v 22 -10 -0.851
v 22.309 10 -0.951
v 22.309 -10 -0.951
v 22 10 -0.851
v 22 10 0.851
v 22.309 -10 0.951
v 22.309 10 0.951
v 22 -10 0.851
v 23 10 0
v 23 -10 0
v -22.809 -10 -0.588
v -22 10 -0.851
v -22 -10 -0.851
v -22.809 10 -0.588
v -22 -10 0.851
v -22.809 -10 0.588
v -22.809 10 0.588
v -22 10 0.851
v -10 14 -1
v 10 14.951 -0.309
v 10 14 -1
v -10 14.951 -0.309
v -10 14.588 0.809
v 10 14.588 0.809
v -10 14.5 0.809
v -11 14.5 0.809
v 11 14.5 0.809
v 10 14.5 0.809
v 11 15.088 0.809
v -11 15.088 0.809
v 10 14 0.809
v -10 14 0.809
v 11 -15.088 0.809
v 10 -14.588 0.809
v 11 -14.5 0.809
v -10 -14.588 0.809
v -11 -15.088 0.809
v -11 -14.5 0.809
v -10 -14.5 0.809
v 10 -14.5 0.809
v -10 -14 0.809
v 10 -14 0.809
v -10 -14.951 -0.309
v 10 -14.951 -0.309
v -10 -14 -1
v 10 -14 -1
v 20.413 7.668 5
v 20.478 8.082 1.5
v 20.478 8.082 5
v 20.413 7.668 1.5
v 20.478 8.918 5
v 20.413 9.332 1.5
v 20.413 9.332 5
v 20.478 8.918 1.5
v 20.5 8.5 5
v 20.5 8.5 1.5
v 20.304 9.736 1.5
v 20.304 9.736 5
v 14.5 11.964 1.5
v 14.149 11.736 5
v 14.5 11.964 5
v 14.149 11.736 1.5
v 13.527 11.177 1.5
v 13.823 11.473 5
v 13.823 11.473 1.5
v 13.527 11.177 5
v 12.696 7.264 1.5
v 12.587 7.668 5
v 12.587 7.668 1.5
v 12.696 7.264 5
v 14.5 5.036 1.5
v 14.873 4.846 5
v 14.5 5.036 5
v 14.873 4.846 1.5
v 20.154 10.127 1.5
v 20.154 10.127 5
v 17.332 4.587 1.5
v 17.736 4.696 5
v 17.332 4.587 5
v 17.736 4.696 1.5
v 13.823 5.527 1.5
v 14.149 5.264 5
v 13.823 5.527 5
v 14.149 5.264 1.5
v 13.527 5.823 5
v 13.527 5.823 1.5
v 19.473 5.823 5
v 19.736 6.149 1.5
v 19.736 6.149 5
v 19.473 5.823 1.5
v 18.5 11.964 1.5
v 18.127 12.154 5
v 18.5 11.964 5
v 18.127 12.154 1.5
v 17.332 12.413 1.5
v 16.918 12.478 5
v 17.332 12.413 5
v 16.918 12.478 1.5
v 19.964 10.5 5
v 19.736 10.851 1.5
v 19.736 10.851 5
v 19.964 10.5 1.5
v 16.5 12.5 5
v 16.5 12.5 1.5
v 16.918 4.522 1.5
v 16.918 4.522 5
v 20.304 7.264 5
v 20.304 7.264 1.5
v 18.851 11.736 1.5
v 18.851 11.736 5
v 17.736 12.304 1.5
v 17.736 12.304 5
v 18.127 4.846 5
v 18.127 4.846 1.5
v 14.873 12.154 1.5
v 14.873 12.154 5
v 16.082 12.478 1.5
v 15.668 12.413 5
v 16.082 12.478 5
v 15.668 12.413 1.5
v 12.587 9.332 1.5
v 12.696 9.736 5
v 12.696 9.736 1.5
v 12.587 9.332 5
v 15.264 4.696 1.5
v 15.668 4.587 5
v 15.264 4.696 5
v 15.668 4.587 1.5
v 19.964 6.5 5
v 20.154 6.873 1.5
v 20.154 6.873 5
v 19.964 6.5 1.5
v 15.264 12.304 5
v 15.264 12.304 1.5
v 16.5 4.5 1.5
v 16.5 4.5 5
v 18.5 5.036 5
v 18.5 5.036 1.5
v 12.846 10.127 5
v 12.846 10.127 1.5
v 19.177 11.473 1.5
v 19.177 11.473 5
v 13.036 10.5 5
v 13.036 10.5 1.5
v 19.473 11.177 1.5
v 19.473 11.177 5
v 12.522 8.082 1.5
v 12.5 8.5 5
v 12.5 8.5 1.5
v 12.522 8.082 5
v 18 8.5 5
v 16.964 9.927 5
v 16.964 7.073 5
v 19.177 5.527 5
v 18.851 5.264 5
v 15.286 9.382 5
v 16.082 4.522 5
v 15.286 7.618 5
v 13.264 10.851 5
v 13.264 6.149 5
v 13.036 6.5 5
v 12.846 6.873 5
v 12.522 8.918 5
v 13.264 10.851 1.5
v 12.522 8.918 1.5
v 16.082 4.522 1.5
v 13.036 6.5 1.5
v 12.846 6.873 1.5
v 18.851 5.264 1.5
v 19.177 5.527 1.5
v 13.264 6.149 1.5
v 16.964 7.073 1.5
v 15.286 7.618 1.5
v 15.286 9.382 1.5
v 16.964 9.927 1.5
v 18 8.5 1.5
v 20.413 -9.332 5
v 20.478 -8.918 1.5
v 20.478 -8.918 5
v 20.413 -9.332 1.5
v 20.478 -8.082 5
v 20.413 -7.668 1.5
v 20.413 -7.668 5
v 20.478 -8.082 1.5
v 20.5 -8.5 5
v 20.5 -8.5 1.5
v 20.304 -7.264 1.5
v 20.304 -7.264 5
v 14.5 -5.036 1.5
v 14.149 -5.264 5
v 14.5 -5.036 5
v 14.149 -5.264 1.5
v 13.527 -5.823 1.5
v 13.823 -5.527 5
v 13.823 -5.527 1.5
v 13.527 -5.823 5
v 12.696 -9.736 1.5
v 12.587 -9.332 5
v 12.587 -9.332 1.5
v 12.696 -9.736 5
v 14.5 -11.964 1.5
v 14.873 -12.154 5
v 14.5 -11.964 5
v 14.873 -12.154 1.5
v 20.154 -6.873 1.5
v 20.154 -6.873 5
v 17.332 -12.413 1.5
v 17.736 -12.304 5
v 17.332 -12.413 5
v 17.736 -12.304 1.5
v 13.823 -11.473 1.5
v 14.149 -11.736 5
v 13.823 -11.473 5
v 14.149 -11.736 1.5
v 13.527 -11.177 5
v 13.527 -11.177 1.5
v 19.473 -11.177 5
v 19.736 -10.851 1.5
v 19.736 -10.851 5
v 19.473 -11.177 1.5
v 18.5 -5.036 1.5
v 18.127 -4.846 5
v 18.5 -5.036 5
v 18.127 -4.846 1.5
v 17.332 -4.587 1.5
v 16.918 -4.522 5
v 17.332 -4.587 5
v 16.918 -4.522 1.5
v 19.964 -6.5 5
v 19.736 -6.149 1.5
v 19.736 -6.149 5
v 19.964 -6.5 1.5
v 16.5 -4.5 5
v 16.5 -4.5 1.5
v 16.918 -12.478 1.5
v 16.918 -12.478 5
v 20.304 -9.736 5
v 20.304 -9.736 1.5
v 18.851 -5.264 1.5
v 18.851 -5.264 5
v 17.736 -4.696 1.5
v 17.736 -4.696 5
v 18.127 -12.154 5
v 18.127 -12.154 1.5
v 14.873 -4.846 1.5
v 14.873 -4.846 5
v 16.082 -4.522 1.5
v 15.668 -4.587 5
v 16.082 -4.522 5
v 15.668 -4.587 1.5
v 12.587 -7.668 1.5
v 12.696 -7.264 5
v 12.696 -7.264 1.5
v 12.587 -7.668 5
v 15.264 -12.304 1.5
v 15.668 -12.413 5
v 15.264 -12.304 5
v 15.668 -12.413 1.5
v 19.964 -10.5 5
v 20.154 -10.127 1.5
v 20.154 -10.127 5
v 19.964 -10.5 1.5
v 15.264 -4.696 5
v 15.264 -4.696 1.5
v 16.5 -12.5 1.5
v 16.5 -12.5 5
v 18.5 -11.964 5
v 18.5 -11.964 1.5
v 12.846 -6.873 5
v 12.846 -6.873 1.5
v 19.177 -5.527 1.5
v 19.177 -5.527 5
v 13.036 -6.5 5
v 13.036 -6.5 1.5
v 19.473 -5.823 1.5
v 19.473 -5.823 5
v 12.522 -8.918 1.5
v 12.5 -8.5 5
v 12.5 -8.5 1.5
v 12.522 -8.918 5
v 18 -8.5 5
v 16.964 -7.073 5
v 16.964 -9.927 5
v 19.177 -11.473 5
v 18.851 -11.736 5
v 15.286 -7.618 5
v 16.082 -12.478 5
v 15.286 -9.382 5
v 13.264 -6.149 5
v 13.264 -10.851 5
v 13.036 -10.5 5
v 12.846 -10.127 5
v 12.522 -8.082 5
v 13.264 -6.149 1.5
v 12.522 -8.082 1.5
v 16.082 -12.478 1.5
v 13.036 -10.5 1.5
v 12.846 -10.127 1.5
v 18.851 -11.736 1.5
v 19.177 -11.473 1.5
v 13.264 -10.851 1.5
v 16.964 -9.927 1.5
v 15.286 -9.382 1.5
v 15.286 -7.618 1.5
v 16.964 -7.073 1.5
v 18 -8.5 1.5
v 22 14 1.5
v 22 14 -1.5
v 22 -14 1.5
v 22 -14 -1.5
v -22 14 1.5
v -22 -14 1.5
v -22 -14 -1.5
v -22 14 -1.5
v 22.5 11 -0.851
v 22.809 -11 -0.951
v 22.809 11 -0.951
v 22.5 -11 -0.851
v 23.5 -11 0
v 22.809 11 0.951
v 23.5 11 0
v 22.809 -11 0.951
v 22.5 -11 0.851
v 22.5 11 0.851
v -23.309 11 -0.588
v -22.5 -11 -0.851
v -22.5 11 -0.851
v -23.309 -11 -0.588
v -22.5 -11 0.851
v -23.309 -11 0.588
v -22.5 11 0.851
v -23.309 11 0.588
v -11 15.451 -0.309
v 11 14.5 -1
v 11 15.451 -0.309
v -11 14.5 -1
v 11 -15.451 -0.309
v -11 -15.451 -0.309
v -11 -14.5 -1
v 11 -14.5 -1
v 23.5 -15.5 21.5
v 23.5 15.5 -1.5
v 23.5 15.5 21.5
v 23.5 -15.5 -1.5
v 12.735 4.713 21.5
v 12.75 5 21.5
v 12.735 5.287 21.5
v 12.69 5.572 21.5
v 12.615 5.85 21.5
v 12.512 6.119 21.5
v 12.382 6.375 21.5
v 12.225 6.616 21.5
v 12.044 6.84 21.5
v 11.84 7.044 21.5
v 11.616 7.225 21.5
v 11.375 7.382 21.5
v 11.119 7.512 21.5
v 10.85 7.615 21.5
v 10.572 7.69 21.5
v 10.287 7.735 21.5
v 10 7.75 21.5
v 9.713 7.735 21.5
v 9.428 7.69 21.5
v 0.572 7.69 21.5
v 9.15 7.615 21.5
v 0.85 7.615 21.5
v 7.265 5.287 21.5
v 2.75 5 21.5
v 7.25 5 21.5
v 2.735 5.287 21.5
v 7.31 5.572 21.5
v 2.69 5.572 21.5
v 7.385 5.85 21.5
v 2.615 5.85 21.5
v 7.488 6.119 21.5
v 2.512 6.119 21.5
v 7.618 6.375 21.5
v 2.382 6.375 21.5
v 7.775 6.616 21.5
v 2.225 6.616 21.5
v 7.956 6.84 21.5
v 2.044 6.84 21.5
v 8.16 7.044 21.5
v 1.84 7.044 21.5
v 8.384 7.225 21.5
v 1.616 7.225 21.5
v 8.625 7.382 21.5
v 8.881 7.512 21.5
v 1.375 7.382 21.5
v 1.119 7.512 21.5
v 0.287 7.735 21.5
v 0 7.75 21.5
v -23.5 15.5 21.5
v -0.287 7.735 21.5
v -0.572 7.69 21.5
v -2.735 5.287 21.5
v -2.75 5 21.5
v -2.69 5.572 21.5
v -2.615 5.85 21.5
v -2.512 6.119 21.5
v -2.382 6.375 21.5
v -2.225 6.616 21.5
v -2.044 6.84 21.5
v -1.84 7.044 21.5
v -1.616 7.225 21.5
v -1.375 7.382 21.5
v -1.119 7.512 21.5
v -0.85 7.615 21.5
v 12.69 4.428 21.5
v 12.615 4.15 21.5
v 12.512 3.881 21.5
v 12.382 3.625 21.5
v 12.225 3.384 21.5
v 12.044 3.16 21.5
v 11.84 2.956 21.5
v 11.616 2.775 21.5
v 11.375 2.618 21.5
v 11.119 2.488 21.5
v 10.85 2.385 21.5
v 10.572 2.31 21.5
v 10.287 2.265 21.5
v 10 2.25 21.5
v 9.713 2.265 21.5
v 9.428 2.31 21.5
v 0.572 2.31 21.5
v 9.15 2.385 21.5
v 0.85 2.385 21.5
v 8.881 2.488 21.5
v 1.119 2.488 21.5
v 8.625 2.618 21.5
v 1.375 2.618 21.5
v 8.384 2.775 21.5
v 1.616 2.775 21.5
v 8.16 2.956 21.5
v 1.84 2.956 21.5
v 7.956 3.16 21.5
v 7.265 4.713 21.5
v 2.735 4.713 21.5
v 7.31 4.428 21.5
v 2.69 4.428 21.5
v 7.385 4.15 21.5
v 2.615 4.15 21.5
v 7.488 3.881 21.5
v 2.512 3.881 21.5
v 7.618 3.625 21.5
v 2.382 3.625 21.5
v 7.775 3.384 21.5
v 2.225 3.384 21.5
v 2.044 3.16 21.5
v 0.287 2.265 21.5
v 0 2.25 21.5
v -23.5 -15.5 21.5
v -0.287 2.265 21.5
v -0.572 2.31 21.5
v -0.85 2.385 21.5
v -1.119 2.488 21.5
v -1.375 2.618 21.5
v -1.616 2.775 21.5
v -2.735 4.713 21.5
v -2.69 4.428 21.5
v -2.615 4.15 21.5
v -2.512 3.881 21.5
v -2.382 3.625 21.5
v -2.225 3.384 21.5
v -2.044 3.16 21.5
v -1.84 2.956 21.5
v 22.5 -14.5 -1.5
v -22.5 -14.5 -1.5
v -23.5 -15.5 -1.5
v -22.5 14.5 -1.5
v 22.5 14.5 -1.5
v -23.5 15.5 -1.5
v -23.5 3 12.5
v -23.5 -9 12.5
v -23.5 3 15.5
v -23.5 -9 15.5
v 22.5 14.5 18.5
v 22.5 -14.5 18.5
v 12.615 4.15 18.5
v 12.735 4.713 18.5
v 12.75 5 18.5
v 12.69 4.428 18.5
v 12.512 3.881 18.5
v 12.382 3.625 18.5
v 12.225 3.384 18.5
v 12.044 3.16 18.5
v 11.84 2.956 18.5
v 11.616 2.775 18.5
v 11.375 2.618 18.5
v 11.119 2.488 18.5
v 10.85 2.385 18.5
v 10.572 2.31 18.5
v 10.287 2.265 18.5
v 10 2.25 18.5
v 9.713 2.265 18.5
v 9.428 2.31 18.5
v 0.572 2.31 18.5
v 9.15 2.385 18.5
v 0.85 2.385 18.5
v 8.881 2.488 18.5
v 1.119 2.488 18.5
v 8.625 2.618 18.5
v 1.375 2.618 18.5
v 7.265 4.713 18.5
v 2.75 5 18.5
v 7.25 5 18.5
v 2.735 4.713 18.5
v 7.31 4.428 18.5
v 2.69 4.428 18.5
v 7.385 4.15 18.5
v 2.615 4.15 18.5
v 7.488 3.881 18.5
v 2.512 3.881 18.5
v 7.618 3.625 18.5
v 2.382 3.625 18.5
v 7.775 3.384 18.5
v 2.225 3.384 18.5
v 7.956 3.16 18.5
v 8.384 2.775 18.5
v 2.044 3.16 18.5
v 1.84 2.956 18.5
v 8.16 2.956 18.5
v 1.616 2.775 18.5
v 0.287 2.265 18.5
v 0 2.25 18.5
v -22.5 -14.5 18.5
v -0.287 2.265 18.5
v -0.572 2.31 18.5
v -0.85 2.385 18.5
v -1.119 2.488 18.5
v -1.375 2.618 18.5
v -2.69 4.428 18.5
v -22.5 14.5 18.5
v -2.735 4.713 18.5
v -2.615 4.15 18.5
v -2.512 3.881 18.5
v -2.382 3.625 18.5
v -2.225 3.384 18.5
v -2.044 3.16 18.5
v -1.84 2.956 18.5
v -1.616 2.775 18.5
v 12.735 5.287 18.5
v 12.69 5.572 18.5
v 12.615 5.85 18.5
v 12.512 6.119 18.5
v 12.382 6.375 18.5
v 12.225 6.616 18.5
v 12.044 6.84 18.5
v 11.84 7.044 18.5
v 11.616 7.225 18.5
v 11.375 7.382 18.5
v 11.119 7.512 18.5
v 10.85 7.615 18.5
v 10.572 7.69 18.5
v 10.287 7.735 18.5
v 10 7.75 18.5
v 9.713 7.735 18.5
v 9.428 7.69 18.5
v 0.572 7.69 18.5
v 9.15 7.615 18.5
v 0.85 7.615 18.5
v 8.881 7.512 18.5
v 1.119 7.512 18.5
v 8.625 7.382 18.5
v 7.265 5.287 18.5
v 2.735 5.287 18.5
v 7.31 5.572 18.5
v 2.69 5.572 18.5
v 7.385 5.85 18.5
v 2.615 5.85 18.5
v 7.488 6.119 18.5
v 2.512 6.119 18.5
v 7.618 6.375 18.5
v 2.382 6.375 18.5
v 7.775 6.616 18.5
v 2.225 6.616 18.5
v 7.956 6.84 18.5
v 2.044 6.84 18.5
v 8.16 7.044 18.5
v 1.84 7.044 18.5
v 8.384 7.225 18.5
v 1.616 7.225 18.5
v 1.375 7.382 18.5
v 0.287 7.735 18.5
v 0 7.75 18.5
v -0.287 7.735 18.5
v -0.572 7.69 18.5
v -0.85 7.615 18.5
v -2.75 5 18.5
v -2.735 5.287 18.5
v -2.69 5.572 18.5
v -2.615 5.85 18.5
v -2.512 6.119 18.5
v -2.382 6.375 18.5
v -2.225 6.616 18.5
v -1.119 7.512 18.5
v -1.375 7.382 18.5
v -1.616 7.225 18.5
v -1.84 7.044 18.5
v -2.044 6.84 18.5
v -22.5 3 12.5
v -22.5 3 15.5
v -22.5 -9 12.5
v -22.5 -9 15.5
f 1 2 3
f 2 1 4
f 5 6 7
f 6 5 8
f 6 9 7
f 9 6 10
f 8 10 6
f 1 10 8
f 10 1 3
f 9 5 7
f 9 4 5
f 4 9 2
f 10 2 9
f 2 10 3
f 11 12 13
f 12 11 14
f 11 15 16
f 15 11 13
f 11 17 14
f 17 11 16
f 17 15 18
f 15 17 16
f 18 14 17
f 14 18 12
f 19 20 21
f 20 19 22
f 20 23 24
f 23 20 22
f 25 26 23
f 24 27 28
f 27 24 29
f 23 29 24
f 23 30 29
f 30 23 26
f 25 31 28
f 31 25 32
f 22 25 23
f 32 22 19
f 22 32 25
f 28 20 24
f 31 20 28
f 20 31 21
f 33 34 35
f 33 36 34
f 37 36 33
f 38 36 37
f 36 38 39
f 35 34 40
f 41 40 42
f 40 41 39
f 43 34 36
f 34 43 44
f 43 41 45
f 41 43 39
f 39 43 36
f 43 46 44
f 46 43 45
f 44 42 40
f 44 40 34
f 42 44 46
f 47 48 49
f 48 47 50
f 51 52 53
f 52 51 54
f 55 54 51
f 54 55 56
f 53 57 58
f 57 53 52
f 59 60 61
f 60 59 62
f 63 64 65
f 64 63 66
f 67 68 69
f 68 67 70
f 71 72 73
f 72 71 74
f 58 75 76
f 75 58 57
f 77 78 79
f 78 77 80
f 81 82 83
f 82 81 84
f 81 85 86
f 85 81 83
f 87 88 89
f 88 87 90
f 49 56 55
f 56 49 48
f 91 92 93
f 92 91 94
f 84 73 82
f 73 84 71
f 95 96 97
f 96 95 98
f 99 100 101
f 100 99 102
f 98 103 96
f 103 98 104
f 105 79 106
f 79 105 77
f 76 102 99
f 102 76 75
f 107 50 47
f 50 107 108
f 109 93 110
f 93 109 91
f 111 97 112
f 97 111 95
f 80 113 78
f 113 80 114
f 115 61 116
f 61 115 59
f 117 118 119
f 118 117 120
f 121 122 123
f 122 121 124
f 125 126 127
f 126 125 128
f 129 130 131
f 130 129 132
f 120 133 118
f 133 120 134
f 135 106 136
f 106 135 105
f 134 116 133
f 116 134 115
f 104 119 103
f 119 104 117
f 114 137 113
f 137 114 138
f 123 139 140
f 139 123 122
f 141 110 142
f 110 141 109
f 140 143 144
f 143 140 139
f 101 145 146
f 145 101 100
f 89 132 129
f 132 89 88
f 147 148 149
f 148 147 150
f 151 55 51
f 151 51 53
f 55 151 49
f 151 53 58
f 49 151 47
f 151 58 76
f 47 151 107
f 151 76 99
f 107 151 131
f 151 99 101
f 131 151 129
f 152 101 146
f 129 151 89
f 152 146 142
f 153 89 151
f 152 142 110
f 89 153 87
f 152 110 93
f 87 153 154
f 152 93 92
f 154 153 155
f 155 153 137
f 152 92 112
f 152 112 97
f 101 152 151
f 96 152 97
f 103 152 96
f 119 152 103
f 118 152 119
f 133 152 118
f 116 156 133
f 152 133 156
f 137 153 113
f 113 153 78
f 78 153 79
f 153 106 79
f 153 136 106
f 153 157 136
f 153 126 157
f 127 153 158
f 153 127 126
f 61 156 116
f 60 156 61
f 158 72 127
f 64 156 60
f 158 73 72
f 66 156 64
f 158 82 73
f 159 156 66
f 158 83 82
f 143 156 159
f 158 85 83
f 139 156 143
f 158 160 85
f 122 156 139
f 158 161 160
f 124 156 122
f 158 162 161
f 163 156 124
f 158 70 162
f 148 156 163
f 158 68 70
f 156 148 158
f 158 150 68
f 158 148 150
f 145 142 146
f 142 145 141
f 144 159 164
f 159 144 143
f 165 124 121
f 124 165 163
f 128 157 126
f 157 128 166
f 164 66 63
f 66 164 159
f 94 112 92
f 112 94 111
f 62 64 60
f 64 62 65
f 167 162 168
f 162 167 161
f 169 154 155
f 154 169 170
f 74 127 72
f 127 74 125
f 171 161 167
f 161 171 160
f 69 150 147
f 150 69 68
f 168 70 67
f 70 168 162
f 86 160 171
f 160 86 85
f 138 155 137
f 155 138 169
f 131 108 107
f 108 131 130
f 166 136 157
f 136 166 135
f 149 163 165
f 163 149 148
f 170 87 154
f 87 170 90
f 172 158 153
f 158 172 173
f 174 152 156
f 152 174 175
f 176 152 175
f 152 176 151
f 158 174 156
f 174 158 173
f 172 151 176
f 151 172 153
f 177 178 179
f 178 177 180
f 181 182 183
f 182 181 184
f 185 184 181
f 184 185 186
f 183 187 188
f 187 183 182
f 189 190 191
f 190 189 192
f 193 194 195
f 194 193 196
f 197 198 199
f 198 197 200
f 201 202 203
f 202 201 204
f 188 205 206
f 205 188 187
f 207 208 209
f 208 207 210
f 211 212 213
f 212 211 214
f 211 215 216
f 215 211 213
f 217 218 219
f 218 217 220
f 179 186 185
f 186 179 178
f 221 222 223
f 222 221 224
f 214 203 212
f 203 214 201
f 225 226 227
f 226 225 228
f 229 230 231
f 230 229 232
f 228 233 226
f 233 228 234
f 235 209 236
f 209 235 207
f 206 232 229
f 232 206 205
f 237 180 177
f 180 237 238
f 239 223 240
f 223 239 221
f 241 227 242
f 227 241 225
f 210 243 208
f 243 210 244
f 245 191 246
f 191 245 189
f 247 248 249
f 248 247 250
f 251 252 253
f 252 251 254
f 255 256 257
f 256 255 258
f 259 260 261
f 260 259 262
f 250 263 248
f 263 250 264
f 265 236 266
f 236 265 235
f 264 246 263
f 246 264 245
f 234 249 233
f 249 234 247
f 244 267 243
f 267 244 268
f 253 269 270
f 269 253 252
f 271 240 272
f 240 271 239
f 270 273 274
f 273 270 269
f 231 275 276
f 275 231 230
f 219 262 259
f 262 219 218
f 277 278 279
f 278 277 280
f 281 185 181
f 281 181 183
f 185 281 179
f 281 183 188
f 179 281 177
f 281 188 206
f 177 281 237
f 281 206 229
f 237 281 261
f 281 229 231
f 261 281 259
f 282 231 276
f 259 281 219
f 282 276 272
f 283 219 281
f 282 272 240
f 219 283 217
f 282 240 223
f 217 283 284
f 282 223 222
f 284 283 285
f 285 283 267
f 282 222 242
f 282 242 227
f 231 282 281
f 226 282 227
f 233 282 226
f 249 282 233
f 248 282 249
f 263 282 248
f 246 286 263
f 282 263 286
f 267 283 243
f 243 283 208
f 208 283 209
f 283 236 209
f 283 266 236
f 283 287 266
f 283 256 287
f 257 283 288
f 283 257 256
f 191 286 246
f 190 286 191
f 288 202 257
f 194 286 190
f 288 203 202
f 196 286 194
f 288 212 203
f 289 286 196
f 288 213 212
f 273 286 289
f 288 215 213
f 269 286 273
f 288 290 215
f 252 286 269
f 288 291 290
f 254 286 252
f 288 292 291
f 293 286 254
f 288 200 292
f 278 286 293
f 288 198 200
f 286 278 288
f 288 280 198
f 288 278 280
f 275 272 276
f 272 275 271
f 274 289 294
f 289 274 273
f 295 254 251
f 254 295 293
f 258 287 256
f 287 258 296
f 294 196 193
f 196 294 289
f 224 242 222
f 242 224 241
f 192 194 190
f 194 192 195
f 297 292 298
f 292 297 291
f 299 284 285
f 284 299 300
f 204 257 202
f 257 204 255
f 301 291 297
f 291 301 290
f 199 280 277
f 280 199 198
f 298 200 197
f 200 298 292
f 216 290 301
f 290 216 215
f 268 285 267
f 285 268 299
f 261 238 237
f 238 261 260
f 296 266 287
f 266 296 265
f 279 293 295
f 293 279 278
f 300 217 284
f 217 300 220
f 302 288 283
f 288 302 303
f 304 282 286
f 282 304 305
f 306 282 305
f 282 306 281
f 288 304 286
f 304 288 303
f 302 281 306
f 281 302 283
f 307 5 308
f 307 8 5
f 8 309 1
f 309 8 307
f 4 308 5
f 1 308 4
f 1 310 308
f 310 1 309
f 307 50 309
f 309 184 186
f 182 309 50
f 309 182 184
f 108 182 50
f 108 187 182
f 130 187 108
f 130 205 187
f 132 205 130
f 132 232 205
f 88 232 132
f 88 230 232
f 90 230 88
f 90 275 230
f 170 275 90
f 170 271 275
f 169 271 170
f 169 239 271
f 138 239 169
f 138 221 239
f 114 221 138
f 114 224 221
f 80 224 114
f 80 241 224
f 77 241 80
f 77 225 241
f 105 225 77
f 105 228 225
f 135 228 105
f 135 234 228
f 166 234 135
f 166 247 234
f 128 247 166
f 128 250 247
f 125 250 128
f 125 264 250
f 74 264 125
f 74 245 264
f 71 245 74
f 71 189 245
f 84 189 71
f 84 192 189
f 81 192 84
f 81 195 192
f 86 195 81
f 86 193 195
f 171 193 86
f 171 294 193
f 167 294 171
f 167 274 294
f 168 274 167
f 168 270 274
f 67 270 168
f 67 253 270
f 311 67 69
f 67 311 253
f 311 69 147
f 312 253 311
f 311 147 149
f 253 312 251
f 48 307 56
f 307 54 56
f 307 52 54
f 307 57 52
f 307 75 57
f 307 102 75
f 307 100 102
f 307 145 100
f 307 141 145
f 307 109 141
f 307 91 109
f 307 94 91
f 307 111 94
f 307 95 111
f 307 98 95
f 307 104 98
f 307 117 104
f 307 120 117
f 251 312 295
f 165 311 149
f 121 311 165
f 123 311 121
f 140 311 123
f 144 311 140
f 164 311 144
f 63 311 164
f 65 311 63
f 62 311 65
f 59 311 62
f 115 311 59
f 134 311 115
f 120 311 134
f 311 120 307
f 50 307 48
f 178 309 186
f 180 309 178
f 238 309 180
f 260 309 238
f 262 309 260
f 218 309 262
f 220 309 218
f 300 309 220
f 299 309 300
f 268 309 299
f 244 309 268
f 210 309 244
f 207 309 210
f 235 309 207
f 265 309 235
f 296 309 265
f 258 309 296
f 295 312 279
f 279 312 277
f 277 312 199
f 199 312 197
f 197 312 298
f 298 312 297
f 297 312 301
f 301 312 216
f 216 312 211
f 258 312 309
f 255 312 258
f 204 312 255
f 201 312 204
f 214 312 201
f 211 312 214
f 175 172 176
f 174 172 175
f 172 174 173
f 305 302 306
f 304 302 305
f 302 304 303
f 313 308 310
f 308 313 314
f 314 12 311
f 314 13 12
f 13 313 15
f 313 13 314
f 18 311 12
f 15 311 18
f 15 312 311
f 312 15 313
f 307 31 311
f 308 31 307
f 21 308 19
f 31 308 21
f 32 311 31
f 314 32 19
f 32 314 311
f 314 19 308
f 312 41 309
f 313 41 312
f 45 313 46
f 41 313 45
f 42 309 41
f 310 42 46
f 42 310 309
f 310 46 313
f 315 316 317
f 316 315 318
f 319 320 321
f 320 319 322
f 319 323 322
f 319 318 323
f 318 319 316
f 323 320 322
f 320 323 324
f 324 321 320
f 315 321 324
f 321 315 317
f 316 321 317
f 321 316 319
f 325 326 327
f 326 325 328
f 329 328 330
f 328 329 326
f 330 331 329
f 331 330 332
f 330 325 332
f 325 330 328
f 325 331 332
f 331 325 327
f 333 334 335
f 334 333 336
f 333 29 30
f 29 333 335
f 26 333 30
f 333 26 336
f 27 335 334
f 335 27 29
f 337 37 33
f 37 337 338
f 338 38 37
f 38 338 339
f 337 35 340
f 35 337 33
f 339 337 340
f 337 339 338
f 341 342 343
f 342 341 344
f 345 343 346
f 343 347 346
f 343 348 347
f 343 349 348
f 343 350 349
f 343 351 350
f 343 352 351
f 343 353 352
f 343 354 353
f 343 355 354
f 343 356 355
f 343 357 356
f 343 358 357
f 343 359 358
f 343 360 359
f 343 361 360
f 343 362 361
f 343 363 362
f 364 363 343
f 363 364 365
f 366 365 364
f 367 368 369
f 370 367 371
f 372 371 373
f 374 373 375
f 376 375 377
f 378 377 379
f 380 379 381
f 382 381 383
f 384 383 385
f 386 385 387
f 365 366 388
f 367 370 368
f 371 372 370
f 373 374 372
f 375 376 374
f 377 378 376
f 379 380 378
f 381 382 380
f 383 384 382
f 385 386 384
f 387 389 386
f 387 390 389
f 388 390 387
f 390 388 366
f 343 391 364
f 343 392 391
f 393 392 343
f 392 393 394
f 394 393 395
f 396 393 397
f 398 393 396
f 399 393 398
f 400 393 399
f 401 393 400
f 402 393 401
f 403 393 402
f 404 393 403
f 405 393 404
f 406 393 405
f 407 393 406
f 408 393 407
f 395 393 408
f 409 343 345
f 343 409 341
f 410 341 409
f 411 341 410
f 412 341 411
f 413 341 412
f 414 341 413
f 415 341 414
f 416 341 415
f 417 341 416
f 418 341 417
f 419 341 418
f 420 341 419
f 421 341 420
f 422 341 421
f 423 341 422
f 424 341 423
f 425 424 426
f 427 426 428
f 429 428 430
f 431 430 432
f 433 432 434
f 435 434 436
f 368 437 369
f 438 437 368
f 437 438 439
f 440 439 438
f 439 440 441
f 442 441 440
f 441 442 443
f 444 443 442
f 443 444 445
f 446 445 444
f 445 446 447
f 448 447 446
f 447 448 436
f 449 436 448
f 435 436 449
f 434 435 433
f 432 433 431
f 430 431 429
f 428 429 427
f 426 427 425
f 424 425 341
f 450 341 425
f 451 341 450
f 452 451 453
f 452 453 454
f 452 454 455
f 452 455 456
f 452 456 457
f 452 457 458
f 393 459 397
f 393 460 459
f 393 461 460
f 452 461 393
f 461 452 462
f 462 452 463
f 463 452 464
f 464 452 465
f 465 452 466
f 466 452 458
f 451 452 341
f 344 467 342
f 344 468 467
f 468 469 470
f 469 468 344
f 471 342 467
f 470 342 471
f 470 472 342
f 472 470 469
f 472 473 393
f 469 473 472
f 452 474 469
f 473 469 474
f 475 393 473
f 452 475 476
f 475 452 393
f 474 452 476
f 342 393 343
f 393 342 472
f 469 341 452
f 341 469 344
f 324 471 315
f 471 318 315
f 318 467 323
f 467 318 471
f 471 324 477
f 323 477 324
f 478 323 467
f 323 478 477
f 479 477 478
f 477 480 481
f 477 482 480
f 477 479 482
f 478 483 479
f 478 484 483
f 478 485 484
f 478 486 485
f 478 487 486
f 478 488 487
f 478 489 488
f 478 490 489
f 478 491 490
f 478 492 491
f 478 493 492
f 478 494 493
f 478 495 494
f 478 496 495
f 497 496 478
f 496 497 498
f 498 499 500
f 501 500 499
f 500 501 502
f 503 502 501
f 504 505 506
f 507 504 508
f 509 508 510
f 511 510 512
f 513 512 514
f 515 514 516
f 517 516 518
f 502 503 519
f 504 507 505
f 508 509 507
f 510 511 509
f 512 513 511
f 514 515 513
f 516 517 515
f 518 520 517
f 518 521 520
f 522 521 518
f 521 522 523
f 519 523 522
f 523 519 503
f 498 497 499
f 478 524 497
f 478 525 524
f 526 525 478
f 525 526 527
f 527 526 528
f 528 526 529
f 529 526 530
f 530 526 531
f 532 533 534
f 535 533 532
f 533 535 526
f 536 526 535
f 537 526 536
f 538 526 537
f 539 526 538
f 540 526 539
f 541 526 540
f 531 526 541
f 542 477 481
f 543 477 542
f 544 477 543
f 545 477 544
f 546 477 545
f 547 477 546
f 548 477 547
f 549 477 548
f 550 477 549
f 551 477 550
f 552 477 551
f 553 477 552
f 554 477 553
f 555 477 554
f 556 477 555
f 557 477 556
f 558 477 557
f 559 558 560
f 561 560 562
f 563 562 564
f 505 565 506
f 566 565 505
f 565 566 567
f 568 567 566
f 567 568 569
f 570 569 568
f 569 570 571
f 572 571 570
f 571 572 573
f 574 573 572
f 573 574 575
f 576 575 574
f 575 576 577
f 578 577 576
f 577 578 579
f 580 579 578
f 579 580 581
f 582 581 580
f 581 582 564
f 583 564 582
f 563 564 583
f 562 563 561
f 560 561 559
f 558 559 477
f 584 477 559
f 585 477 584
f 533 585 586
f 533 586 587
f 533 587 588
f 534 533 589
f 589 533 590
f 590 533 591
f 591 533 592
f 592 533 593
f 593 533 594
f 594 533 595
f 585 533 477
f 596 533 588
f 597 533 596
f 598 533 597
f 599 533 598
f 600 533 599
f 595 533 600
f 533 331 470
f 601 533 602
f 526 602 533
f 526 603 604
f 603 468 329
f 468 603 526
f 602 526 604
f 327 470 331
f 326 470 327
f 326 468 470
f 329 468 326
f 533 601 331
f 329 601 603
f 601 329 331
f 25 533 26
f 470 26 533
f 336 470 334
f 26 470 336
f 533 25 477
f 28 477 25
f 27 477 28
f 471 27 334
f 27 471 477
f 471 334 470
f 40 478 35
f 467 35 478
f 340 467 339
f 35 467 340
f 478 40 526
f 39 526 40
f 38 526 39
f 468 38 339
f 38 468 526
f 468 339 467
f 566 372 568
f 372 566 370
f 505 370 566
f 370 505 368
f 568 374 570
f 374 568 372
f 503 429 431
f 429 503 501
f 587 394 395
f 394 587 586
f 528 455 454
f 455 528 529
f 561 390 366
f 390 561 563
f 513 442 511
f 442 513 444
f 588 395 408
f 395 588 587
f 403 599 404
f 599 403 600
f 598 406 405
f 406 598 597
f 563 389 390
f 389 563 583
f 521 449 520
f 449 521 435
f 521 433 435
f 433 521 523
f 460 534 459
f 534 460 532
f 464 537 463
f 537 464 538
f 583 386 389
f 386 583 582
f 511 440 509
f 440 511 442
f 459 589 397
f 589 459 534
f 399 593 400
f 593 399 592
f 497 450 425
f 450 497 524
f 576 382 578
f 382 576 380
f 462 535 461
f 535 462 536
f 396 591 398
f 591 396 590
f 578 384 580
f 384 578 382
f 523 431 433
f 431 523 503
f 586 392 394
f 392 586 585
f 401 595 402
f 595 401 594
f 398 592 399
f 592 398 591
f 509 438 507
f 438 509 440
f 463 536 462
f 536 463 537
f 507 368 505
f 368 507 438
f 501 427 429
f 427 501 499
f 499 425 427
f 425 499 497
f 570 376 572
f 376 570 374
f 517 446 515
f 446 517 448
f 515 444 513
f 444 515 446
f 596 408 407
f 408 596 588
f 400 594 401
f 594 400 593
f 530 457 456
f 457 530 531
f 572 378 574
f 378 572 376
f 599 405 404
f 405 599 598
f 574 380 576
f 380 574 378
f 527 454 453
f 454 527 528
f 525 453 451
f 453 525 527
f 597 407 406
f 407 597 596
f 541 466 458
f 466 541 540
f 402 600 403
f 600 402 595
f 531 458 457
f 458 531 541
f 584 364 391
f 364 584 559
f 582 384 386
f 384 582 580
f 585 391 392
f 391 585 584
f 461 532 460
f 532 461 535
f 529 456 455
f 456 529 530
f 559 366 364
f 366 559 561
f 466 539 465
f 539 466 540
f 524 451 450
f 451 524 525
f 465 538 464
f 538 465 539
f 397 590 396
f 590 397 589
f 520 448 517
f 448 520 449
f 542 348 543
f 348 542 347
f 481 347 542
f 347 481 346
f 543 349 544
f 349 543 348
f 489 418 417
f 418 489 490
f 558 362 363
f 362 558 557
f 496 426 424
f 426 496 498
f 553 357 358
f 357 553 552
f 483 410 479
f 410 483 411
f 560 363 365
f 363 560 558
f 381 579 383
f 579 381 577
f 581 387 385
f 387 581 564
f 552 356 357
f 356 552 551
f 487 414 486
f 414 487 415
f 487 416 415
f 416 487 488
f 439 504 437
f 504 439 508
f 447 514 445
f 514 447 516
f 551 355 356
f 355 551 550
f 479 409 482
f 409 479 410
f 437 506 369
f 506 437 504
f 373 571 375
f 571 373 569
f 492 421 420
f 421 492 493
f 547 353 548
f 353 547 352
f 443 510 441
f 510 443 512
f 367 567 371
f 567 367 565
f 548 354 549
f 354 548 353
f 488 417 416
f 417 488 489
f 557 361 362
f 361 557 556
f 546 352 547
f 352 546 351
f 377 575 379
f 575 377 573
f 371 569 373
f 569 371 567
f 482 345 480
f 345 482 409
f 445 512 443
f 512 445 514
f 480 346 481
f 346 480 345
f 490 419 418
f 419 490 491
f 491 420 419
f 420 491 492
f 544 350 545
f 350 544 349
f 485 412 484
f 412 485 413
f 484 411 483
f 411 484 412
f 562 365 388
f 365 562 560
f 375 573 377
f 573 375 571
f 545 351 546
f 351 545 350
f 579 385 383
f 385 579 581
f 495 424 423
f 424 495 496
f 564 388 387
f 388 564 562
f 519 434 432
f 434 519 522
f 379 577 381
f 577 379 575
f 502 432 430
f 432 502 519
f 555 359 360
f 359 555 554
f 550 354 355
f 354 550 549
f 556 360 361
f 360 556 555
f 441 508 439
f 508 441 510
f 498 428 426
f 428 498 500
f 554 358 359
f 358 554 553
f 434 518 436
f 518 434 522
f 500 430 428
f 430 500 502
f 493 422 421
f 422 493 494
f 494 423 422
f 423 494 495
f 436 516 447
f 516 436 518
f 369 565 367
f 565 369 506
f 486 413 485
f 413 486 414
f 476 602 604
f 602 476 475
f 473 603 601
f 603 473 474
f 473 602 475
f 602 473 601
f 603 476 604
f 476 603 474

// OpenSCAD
// Schrankbeleuchtung
/* [Maße:]*/
pX = 42;
// Sensorplatine x
pY = 26;
// Sensorplatine y
pZ = 1;
// Sensorplatine z
cX = 90;
// Sensorplatine x
cY = 70;
// Sensorplatine y
cZ = 1;
// Sensorplatine z

/* [Teile:]*/
BoxUnten = true;
BoxOben = true;
ControllerUnten = false;
ControllerOben = false;


module Platinenhalt() {
    difference() {
        cylinder(d=8,h=4,$fn=60, center=true);
        cylinder(d=3,h=6,center=true);
    }
}

module Rastnase(rX, rY) {
    translate([(rX/2+1),0,0])
    rotate([90,0,0])
    cylinder(d=2,h=20,center=true);
    translate([-(rX/2+1),0,0])
    rotate([90,0,0])
    cylinder(d=2,h=20,center=true);
    translate([0,(rY/2+1),0])
    rotate([0,90,0])
    cylinder(d=2,h=20,center=true);
    translate([0,-(rY/2+1),0])
    rotate([0,90,0])
    cylinder(d=2,h=20,center=true);
}


module Rastrillen(rX, rY) {
    translate([(rX/2+1.5),0,0])
    rotate([90,0,0])
    cylinder(d=2,h=22,center=true);
    translate([-(rX/2+1.5),0,0])
    rotate([90,0,0])
    cylinder(d=2,h=22,center=true);
    translate([0,(rY/2+1.5),0])
    rotate([0,90,0])
    cylinder(d=2,h=22,center=true);
    translate([0,-(rY/2+1.5),0])
    rotate([0,90,0])
    cylinder(d=2,h=22,center=true);
}

module BoxUnten() {
    union() {
        cube([pX+2,pY+2,3],center=true); 
        Rastnase(pX,pY);
        translate([pX/2-4.5,pY/2-4.5,3]) Platinenhalt();
        translate([pX/2-4.5,-(pY/2-4.5),3]) Platinenhalt();
        }

}
module BoxOben() {
    translate([0,0,23/2-1.5])
    union() {
        difference() {
            cube([pX+5,pY+5, 23],center=true);
            translate([0,0,-3])
            cube([pX+3,pY+3, 23], center=true);
            
            translate([0,5,0])
            cylinder(d=5.5,h=50,$fn=60,center=true);
            
            translate([10,5,0])
            cylinder(d=5.5,h=50,$fn=60,center=true);
            
            translate([-25,-3,4])
            cube([5,12,3],center=true);
            
            translate([0,0,-10])
            Rastrillen(pX,pY);
        }
    }
}

module ControllerUnten() {
    union() {
        cube([cX+4,cY+4,3],center=true); 
        Rastnase(cX+3, cY+3);
        a=2.5;
        translate([cX/2-a,cY/2-a,3]) Platinenhalt();
        translate([cX/2-a,-(cY/2-a),3]) Platinenhalt();
        translate([-cX/2+a,cY/2-a,3]) Platinenhalt();
        translate([-cX/2+a,-(cY/2-a),3]) Platinenhalt();
        }

}

module ControllerOben() {
    translate([0,0,35/2-1.5])
    union() {
        difference() {
            roundedCube(cX+7,cY+7, 35);
            translate([0,0,-3])
            cube([cX+5,cY+5, 35], center=true);
            
            rotate([90,0,0])
            translate([-35,5,cY/2])
            cylinder(d=8,h=50,$fn=60,center=true);
            
            translate([-25,-3,4])
            cube([5,12,3],center=true);
            
            translate([0,0,-15.5])
            Rastrillen(cX+3,cY+3);
            
            translate([-cX/2,0,0])
            Kabelschlitz();

            translate([-cX/2,-20,0])
            Kabelschlitz();

            translate([-cX/2,20,0])
            Kabelschlitz();
            
            translate([cX/2,-5,0])
            Kabelschlitz();

            translate([cX/2,-25,0])
            Kabelschlitz();

            translate([cX/2,15,0])
            Kabelschlitz();
            
            
            
            
        }
    }
}

module roundedCube(x,y,z) {
    hull() {
        for (i=[-1,1])
        for (j=[-1,1])
        translate([i*(x/2-3),j*(y/2-3),0])
        cylinder(d=8,h=z, $fn=60, center=true);
    }
}

module Kabelschlitz(){
    cube([10,10,2],center=true);
}

if (BoxUnten) BoxUnten();
if (BoxOben) BoxOben();
if (ControllerUnten) ControllerUnten();
if (ControllerOben) ControllerOben();
    
